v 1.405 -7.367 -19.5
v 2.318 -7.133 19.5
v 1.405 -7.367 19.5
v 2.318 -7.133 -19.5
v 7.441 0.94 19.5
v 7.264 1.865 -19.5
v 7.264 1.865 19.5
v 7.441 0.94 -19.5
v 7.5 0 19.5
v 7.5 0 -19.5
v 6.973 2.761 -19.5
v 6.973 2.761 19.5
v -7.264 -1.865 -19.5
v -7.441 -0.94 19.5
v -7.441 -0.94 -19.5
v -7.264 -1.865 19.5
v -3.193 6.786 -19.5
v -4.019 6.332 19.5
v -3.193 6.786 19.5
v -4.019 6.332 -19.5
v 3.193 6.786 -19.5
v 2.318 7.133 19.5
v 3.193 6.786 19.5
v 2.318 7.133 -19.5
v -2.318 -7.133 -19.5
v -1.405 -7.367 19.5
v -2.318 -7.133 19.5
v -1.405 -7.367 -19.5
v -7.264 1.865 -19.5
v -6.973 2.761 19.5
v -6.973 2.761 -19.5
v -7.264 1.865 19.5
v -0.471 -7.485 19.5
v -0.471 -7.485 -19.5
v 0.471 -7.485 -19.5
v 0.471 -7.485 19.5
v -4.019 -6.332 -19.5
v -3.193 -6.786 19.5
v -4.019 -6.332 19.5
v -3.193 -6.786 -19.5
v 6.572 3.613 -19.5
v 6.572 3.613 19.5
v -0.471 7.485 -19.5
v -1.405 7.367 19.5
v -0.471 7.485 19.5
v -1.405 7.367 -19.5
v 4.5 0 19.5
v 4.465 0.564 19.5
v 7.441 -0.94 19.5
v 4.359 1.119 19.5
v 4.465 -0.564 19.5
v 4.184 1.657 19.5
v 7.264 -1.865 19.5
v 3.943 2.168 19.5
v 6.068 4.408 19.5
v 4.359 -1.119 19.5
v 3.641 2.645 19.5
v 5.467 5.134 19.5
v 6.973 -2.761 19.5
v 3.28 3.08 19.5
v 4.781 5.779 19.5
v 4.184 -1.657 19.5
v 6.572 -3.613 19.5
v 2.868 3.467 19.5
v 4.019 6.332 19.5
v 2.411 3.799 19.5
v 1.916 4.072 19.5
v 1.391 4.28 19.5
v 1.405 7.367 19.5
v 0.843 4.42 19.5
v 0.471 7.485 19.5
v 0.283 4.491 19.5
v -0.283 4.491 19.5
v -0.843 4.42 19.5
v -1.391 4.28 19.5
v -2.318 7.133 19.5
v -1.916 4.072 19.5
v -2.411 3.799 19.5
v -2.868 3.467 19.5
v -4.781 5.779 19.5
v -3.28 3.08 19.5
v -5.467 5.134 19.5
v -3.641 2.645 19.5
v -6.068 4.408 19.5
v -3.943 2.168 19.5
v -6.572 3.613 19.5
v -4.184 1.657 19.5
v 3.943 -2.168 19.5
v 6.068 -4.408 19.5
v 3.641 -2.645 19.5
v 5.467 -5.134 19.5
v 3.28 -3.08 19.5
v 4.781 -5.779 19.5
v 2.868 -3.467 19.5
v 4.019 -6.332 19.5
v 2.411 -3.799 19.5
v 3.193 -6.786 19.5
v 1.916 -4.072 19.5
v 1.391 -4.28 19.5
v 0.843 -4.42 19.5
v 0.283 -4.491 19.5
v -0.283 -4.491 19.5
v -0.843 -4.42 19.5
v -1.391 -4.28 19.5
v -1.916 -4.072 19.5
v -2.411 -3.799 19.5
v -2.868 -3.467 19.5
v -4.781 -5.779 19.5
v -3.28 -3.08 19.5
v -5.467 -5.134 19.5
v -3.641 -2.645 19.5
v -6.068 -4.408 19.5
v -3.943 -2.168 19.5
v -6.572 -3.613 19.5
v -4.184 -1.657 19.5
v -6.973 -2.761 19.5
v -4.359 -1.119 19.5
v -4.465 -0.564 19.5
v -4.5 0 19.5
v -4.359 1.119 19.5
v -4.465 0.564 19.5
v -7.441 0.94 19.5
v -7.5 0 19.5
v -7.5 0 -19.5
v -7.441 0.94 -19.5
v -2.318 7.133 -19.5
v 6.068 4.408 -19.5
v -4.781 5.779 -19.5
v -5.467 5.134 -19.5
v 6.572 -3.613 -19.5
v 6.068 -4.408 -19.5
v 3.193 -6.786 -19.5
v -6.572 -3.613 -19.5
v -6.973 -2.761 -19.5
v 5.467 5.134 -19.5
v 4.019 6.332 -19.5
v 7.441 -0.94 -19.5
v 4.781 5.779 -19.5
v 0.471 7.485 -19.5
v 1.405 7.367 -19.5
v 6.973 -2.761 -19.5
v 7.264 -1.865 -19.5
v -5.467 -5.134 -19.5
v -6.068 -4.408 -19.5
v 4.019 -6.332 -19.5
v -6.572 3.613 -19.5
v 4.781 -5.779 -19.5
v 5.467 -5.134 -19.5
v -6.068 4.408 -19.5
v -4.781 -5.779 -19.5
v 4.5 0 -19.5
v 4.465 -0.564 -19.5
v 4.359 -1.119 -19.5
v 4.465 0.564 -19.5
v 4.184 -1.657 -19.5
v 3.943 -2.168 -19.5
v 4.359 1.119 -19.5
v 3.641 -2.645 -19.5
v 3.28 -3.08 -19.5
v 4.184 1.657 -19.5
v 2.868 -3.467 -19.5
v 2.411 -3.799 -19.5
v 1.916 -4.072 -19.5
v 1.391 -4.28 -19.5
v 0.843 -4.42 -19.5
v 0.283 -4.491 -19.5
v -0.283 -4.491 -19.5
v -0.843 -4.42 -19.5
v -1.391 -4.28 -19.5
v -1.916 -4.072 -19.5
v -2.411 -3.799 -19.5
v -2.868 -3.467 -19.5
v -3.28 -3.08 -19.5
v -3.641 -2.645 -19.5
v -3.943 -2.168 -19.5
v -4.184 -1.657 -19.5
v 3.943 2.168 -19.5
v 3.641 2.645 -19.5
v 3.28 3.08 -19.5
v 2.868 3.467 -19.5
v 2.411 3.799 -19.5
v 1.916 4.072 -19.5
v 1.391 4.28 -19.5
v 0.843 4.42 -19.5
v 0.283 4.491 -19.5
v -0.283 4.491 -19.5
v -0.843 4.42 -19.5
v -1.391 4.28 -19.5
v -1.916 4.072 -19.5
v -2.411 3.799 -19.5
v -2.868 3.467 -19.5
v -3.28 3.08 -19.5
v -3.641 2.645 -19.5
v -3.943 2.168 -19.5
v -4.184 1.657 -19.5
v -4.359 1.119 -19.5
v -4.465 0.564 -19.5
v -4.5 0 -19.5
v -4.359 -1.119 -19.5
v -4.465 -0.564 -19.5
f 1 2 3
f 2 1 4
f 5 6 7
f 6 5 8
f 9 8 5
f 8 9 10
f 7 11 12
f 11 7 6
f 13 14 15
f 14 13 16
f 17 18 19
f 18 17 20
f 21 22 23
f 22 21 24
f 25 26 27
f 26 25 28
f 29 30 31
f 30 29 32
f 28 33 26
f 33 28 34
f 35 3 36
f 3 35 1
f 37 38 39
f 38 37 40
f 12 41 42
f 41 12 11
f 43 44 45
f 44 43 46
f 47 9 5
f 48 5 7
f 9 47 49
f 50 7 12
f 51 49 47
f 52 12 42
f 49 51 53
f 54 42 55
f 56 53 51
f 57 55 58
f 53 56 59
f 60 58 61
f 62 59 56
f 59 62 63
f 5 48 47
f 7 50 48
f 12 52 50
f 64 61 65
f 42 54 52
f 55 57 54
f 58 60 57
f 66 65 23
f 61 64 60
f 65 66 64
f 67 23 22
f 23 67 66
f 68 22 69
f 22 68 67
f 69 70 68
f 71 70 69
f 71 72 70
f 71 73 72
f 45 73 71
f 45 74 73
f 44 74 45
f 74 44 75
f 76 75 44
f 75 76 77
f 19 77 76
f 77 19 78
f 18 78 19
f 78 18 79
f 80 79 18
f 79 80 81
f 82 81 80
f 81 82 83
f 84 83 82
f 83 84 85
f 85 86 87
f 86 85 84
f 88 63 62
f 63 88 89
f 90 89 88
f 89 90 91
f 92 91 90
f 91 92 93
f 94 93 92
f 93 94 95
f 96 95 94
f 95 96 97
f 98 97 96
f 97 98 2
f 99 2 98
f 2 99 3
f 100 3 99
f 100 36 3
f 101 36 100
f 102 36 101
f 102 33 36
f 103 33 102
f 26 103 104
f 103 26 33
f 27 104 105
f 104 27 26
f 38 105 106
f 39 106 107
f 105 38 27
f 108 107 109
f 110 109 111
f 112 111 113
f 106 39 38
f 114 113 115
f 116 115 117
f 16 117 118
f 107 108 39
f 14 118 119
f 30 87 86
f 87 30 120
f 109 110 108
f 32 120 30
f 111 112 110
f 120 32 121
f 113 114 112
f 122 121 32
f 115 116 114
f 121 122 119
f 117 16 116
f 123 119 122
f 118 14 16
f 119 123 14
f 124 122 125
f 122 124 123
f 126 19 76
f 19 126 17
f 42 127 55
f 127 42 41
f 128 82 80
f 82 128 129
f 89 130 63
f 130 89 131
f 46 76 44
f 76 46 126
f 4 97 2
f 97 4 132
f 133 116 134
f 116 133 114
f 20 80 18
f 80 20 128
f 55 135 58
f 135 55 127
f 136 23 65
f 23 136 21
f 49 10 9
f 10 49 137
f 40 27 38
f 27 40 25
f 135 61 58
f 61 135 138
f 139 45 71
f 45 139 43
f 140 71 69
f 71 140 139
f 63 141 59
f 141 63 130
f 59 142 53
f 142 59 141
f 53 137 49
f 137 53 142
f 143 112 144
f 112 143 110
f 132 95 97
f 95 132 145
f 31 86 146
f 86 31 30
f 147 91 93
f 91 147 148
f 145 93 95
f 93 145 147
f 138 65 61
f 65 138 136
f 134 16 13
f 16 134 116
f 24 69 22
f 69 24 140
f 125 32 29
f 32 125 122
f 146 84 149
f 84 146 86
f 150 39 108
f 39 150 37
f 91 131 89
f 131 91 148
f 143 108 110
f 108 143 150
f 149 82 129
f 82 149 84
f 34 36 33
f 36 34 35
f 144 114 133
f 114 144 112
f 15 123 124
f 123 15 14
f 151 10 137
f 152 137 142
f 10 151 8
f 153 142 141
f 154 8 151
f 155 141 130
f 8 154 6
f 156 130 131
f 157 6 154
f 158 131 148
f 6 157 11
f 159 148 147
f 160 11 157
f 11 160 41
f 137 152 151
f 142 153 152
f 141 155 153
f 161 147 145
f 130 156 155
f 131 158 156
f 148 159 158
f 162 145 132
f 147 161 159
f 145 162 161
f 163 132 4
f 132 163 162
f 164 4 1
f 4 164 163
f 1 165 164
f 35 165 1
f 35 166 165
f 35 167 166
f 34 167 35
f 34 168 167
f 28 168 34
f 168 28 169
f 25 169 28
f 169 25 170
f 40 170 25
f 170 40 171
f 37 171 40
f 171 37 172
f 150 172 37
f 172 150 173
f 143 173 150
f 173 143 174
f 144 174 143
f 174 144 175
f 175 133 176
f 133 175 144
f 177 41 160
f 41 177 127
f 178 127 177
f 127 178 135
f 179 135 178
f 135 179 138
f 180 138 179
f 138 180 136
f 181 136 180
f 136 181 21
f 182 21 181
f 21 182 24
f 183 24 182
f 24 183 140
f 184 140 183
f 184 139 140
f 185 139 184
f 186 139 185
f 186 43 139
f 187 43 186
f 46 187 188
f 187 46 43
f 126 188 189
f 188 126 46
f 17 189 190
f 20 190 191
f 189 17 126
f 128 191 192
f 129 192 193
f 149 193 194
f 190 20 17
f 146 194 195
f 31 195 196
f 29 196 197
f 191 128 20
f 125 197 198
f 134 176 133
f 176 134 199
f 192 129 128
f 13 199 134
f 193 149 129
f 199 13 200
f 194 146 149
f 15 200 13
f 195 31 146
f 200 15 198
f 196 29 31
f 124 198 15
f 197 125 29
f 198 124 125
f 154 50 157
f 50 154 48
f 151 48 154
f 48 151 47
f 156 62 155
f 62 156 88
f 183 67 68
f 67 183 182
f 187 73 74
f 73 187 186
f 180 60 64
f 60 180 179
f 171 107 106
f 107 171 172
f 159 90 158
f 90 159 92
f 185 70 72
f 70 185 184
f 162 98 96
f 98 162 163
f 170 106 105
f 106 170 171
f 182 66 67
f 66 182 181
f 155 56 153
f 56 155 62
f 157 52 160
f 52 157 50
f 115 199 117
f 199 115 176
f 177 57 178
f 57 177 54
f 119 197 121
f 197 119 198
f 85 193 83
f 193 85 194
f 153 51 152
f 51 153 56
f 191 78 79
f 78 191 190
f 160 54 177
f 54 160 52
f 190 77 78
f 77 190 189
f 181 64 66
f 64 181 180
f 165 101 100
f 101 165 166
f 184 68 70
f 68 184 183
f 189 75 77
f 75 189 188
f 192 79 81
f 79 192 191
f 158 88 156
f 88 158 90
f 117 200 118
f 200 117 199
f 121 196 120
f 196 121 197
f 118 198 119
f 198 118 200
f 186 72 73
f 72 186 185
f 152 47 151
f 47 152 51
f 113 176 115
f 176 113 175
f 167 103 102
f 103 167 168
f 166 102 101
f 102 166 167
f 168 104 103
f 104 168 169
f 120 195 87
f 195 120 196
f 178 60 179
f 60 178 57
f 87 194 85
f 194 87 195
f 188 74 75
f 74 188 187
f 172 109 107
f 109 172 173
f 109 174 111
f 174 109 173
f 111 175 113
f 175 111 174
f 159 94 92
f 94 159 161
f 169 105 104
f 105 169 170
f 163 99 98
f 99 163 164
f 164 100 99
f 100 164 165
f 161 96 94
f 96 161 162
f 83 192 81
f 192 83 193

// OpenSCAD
$fn = 50;


difference() {
	union() {
		translate(v = [0, 0, -19.5000000000]) {
			cylinder(h = 39, r = 7.5000000000);
		}
	}
	union() {
		translate(v = [0, 0, -100.0000000000]) {
			cylinder(h = 200, r = 4.5000000000);
		}
	}
}
